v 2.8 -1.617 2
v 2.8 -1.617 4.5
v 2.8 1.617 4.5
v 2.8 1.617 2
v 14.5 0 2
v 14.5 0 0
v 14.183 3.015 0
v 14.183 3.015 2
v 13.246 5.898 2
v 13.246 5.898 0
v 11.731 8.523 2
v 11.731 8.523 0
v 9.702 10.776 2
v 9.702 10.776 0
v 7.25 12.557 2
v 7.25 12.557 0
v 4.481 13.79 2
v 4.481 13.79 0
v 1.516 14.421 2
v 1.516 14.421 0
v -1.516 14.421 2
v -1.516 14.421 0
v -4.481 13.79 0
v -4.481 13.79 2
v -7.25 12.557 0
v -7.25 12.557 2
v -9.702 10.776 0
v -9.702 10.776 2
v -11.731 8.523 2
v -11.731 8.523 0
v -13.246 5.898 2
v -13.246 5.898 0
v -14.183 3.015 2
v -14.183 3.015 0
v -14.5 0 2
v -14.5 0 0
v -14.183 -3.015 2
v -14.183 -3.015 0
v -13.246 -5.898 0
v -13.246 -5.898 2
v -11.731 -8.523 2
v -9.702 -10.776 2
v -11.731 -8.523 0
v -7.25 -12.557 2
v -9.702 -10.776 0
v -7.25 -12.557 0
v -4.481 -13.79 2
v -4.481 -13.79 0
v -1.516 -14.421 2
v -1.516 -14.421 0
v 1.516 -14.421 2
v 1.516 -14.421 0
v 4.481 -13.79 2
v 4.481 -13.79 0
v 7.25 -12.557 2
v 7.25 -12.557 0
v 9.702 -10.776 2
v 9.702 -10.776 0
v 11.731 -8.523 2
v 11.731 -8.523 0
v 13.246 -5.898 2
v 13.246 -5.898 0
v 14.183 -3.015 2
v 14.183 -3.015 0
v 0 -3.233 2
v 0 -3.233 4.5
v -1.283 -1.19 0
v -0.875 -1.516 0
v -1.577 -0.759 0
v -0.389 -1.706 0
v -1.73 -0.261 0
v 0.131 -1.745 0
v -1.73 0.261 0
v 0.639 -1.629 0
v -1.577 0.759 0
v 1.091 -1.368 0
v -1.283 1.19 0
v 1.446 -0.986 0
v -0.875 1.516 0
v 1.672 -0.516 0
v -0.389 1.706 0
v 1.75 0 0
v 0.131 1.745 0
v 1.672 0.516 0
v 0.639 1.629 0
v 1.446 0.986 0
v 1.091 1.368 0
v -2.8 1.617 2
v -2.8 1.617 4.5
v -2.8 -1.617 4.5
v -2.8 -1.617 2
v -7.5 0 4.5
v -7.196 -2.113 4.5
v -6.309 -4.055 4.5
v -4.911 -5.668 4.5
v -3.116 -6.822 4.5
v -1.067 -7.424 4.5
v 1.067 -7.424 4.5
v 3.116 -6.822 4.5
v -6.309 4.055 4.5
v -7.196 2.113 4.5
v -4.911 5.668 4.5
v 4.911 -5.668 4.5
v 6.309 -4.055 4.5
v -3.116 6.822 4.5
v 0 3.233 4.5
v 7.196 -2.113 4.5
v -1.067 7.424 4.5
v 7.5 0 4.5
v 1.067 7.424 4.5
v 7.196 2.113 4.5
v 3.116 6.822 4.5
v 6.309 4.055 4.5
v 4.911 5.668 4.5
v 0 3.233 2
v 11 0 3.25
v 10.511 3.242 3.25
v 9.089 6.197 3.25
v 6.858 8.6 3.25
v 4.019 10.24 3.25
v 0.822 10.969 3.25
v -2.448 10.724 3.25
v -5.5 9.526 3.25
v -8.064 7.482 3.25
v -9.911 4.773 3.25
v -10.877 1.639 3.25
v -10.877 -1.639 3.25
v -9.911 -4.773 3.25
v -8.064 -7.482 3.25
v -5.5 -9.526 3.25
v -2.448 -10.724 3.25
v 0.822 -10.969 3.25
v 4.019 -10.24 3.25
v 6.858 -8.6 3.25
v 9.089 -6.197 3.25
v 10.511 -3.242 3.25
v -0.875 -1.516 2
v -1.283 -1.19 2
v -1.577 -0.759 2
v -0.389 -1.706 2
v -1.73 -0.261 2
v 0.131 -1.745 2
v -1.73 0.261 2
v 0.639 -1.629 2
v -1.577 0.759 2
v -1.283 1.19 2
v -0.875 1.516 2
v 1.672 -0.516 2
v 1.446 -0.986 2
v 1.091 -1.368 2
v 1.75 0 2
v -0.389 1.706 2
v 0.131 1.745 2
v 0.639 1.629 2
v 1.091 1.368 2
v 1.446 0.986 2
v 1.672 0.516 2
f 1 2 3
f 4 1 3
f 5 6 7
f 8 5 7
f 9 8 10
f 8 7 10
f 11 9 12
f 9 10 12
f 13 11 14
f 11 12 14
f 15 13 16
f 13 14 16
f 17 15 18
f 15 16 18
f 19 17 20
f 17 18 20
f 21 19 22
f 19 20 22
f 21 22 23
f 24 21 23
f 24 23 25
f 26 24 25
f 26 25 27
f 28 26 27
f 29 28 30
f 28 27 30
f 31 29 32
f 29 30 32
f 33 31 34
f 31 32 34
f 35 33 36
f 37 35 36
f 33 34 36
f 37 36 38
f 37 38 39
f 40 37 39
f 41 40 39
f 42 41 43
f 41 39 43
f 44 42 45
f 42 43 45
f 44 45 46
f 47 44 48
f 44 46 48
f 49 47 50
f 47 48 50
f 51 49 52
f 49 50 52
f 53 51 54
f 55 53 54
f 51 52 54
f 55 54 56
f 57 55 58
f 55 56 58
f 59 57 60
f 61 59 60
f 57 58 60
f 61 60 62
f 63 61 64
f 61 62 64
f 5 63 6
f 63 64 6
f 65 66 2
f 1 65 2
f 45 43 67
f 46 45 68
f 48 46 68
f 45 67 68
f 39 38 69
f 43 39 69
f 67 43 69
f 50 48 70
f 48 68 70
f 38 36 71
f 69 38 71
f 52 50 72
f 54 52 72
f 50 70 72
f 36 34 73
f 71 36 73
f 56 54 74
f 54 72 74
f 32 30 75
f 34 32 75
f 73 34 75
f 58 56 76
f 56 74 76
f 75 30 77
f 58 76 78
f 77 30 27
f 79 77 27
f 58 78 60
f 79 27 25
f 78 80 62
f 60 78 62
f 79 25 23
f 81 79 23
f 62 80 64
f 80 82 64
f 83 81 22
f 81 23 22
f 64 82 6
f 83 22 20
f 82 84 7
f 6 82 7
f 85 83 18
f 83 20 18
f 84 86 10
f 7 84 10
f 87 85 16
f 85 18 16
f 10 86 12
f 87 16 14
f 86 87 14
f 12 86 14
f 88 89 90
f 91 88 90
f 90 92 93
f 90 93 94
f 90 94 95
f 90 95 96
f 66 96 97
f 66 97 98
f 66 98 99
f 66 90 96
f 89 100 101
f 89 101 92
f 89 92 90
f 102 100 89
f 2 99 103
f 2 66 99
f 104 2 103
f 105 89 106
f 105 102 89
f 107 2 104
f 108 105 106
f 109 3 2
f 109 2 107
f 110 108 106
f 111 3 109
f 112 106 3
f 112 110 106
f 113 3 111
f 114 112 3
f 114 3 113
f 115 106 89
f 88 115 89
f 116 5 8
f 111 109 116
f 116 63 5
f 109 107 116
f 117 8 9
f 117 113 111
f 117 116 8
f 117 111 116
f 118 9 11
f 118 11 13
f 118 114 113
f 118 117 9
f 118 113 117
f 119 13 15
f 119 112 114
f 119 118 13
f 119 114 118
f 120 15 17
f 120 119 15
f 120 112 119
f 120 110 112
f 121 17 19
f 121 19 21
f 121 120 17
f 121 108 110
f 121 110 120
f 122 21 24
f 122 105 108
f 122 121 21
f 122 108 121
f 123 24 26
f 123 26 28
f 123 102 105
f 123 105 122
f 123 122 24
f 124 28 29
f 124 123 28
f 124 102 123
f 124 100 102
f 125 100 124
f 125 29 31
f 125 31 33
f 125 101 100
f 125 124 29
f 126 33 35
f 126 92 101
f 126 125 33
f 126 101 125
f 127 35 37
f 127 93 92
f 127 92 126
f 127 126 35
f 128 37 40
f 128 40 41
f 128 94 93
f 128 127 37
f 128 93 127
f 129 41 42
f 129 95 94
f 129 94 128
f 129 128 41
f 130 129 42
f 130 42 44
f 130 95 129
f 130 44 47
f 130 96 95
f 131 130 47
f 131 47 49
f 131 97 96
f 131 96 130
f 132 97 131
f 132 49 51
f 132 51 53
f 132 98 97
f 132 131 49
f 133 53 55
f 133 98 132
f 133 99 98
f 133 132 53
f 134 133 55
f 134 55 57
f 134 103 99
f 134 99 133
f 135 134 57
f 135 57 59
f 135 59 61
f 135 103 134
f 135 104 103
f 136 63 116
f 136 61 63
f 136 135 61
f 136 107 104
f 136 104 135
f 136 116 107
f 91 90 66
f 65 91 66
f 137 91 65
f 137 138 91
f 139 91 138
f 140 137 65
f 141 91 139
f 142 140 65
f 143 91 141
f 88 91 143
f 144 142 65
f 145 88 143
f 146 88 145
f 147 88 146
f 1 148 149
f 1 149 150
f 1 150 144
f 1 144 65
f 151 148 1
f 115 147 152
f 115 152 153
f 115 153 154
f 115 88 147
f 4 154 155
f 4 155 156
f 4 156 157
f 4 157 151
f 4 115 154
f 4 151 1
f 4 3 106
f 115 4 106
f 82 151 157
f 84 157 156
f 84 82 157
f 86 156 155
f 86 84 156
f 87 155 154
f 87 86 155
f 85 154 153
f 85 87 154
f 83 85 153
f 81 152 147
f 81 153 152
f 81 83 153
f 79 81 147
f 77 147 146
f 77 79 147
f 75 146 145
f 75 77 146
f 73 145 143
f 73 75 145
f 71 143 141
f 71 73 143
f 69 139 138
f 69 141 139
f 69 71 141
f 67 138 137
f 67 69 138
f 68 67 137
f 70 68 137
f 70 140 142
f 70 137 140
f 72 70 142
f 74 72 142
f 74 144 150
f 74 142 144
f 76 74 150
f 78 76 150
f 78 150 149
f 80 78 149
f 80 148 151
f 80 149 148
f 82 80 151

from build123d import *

# Parameters (mm, degrees)
SKETCH_1_R          = 14.5
EXTRUDE_1_DEPTH     = 2
SKETCH_2_R          = 7.5
CUT_EXTRUDE_2_DEPTH = 2.5
SKETCH_1_4_R        = 1.75
CUT_EXTRUDE_1_DEPTH = 2.8


with BuildPart() as part:
    # Эскиз1 → Бобышка-Вытянуть1 (new body)
    with BuildSketch(Plane.XY):
        Circle(SKETCH_1_R)
    extrude(amount=EXTRUDE_1_DEPTH)

    # Эскиз2 → section 1 of loft_1
    with BuildSketch(Plane.XY.offset(4.5), mode=Mode.PRIVATE) as loft_1_s1:
        Circle(SKETCH_2_R)
    # loft from a face of the part (loft_1)
    loft([part.faces().sort_by_distance((0, 0, 2))[0], loft_1_s1.sketch])

    # Эскиз2<4> → Вырез-Вытянуть2 (cut)
    with BuildSketch(Plane.XY.offset(4.5)):
        Polygon((0, 3.233161507), (-2.8, 1.616580754), (-2.8, -1.616580754), (0, -3.233161507), (2.8, -1.616580754), (2.8, 1.616580754), align=None)
    extrude(amount=-CUT_EXTRUDE_2_DEPTH, mode=Mode.SUBTRACT)

    # Эскиз1<4> → Вырез-Вытянуть1 (cut)
    with BuildSketch(Plane.XY):
        Circle(SKETCH_1_4_R)
    extrude(amount=CUT_EXTRUDE_1_DEPTH, mode=Mode.SUBTRACT)


solid = part.part
